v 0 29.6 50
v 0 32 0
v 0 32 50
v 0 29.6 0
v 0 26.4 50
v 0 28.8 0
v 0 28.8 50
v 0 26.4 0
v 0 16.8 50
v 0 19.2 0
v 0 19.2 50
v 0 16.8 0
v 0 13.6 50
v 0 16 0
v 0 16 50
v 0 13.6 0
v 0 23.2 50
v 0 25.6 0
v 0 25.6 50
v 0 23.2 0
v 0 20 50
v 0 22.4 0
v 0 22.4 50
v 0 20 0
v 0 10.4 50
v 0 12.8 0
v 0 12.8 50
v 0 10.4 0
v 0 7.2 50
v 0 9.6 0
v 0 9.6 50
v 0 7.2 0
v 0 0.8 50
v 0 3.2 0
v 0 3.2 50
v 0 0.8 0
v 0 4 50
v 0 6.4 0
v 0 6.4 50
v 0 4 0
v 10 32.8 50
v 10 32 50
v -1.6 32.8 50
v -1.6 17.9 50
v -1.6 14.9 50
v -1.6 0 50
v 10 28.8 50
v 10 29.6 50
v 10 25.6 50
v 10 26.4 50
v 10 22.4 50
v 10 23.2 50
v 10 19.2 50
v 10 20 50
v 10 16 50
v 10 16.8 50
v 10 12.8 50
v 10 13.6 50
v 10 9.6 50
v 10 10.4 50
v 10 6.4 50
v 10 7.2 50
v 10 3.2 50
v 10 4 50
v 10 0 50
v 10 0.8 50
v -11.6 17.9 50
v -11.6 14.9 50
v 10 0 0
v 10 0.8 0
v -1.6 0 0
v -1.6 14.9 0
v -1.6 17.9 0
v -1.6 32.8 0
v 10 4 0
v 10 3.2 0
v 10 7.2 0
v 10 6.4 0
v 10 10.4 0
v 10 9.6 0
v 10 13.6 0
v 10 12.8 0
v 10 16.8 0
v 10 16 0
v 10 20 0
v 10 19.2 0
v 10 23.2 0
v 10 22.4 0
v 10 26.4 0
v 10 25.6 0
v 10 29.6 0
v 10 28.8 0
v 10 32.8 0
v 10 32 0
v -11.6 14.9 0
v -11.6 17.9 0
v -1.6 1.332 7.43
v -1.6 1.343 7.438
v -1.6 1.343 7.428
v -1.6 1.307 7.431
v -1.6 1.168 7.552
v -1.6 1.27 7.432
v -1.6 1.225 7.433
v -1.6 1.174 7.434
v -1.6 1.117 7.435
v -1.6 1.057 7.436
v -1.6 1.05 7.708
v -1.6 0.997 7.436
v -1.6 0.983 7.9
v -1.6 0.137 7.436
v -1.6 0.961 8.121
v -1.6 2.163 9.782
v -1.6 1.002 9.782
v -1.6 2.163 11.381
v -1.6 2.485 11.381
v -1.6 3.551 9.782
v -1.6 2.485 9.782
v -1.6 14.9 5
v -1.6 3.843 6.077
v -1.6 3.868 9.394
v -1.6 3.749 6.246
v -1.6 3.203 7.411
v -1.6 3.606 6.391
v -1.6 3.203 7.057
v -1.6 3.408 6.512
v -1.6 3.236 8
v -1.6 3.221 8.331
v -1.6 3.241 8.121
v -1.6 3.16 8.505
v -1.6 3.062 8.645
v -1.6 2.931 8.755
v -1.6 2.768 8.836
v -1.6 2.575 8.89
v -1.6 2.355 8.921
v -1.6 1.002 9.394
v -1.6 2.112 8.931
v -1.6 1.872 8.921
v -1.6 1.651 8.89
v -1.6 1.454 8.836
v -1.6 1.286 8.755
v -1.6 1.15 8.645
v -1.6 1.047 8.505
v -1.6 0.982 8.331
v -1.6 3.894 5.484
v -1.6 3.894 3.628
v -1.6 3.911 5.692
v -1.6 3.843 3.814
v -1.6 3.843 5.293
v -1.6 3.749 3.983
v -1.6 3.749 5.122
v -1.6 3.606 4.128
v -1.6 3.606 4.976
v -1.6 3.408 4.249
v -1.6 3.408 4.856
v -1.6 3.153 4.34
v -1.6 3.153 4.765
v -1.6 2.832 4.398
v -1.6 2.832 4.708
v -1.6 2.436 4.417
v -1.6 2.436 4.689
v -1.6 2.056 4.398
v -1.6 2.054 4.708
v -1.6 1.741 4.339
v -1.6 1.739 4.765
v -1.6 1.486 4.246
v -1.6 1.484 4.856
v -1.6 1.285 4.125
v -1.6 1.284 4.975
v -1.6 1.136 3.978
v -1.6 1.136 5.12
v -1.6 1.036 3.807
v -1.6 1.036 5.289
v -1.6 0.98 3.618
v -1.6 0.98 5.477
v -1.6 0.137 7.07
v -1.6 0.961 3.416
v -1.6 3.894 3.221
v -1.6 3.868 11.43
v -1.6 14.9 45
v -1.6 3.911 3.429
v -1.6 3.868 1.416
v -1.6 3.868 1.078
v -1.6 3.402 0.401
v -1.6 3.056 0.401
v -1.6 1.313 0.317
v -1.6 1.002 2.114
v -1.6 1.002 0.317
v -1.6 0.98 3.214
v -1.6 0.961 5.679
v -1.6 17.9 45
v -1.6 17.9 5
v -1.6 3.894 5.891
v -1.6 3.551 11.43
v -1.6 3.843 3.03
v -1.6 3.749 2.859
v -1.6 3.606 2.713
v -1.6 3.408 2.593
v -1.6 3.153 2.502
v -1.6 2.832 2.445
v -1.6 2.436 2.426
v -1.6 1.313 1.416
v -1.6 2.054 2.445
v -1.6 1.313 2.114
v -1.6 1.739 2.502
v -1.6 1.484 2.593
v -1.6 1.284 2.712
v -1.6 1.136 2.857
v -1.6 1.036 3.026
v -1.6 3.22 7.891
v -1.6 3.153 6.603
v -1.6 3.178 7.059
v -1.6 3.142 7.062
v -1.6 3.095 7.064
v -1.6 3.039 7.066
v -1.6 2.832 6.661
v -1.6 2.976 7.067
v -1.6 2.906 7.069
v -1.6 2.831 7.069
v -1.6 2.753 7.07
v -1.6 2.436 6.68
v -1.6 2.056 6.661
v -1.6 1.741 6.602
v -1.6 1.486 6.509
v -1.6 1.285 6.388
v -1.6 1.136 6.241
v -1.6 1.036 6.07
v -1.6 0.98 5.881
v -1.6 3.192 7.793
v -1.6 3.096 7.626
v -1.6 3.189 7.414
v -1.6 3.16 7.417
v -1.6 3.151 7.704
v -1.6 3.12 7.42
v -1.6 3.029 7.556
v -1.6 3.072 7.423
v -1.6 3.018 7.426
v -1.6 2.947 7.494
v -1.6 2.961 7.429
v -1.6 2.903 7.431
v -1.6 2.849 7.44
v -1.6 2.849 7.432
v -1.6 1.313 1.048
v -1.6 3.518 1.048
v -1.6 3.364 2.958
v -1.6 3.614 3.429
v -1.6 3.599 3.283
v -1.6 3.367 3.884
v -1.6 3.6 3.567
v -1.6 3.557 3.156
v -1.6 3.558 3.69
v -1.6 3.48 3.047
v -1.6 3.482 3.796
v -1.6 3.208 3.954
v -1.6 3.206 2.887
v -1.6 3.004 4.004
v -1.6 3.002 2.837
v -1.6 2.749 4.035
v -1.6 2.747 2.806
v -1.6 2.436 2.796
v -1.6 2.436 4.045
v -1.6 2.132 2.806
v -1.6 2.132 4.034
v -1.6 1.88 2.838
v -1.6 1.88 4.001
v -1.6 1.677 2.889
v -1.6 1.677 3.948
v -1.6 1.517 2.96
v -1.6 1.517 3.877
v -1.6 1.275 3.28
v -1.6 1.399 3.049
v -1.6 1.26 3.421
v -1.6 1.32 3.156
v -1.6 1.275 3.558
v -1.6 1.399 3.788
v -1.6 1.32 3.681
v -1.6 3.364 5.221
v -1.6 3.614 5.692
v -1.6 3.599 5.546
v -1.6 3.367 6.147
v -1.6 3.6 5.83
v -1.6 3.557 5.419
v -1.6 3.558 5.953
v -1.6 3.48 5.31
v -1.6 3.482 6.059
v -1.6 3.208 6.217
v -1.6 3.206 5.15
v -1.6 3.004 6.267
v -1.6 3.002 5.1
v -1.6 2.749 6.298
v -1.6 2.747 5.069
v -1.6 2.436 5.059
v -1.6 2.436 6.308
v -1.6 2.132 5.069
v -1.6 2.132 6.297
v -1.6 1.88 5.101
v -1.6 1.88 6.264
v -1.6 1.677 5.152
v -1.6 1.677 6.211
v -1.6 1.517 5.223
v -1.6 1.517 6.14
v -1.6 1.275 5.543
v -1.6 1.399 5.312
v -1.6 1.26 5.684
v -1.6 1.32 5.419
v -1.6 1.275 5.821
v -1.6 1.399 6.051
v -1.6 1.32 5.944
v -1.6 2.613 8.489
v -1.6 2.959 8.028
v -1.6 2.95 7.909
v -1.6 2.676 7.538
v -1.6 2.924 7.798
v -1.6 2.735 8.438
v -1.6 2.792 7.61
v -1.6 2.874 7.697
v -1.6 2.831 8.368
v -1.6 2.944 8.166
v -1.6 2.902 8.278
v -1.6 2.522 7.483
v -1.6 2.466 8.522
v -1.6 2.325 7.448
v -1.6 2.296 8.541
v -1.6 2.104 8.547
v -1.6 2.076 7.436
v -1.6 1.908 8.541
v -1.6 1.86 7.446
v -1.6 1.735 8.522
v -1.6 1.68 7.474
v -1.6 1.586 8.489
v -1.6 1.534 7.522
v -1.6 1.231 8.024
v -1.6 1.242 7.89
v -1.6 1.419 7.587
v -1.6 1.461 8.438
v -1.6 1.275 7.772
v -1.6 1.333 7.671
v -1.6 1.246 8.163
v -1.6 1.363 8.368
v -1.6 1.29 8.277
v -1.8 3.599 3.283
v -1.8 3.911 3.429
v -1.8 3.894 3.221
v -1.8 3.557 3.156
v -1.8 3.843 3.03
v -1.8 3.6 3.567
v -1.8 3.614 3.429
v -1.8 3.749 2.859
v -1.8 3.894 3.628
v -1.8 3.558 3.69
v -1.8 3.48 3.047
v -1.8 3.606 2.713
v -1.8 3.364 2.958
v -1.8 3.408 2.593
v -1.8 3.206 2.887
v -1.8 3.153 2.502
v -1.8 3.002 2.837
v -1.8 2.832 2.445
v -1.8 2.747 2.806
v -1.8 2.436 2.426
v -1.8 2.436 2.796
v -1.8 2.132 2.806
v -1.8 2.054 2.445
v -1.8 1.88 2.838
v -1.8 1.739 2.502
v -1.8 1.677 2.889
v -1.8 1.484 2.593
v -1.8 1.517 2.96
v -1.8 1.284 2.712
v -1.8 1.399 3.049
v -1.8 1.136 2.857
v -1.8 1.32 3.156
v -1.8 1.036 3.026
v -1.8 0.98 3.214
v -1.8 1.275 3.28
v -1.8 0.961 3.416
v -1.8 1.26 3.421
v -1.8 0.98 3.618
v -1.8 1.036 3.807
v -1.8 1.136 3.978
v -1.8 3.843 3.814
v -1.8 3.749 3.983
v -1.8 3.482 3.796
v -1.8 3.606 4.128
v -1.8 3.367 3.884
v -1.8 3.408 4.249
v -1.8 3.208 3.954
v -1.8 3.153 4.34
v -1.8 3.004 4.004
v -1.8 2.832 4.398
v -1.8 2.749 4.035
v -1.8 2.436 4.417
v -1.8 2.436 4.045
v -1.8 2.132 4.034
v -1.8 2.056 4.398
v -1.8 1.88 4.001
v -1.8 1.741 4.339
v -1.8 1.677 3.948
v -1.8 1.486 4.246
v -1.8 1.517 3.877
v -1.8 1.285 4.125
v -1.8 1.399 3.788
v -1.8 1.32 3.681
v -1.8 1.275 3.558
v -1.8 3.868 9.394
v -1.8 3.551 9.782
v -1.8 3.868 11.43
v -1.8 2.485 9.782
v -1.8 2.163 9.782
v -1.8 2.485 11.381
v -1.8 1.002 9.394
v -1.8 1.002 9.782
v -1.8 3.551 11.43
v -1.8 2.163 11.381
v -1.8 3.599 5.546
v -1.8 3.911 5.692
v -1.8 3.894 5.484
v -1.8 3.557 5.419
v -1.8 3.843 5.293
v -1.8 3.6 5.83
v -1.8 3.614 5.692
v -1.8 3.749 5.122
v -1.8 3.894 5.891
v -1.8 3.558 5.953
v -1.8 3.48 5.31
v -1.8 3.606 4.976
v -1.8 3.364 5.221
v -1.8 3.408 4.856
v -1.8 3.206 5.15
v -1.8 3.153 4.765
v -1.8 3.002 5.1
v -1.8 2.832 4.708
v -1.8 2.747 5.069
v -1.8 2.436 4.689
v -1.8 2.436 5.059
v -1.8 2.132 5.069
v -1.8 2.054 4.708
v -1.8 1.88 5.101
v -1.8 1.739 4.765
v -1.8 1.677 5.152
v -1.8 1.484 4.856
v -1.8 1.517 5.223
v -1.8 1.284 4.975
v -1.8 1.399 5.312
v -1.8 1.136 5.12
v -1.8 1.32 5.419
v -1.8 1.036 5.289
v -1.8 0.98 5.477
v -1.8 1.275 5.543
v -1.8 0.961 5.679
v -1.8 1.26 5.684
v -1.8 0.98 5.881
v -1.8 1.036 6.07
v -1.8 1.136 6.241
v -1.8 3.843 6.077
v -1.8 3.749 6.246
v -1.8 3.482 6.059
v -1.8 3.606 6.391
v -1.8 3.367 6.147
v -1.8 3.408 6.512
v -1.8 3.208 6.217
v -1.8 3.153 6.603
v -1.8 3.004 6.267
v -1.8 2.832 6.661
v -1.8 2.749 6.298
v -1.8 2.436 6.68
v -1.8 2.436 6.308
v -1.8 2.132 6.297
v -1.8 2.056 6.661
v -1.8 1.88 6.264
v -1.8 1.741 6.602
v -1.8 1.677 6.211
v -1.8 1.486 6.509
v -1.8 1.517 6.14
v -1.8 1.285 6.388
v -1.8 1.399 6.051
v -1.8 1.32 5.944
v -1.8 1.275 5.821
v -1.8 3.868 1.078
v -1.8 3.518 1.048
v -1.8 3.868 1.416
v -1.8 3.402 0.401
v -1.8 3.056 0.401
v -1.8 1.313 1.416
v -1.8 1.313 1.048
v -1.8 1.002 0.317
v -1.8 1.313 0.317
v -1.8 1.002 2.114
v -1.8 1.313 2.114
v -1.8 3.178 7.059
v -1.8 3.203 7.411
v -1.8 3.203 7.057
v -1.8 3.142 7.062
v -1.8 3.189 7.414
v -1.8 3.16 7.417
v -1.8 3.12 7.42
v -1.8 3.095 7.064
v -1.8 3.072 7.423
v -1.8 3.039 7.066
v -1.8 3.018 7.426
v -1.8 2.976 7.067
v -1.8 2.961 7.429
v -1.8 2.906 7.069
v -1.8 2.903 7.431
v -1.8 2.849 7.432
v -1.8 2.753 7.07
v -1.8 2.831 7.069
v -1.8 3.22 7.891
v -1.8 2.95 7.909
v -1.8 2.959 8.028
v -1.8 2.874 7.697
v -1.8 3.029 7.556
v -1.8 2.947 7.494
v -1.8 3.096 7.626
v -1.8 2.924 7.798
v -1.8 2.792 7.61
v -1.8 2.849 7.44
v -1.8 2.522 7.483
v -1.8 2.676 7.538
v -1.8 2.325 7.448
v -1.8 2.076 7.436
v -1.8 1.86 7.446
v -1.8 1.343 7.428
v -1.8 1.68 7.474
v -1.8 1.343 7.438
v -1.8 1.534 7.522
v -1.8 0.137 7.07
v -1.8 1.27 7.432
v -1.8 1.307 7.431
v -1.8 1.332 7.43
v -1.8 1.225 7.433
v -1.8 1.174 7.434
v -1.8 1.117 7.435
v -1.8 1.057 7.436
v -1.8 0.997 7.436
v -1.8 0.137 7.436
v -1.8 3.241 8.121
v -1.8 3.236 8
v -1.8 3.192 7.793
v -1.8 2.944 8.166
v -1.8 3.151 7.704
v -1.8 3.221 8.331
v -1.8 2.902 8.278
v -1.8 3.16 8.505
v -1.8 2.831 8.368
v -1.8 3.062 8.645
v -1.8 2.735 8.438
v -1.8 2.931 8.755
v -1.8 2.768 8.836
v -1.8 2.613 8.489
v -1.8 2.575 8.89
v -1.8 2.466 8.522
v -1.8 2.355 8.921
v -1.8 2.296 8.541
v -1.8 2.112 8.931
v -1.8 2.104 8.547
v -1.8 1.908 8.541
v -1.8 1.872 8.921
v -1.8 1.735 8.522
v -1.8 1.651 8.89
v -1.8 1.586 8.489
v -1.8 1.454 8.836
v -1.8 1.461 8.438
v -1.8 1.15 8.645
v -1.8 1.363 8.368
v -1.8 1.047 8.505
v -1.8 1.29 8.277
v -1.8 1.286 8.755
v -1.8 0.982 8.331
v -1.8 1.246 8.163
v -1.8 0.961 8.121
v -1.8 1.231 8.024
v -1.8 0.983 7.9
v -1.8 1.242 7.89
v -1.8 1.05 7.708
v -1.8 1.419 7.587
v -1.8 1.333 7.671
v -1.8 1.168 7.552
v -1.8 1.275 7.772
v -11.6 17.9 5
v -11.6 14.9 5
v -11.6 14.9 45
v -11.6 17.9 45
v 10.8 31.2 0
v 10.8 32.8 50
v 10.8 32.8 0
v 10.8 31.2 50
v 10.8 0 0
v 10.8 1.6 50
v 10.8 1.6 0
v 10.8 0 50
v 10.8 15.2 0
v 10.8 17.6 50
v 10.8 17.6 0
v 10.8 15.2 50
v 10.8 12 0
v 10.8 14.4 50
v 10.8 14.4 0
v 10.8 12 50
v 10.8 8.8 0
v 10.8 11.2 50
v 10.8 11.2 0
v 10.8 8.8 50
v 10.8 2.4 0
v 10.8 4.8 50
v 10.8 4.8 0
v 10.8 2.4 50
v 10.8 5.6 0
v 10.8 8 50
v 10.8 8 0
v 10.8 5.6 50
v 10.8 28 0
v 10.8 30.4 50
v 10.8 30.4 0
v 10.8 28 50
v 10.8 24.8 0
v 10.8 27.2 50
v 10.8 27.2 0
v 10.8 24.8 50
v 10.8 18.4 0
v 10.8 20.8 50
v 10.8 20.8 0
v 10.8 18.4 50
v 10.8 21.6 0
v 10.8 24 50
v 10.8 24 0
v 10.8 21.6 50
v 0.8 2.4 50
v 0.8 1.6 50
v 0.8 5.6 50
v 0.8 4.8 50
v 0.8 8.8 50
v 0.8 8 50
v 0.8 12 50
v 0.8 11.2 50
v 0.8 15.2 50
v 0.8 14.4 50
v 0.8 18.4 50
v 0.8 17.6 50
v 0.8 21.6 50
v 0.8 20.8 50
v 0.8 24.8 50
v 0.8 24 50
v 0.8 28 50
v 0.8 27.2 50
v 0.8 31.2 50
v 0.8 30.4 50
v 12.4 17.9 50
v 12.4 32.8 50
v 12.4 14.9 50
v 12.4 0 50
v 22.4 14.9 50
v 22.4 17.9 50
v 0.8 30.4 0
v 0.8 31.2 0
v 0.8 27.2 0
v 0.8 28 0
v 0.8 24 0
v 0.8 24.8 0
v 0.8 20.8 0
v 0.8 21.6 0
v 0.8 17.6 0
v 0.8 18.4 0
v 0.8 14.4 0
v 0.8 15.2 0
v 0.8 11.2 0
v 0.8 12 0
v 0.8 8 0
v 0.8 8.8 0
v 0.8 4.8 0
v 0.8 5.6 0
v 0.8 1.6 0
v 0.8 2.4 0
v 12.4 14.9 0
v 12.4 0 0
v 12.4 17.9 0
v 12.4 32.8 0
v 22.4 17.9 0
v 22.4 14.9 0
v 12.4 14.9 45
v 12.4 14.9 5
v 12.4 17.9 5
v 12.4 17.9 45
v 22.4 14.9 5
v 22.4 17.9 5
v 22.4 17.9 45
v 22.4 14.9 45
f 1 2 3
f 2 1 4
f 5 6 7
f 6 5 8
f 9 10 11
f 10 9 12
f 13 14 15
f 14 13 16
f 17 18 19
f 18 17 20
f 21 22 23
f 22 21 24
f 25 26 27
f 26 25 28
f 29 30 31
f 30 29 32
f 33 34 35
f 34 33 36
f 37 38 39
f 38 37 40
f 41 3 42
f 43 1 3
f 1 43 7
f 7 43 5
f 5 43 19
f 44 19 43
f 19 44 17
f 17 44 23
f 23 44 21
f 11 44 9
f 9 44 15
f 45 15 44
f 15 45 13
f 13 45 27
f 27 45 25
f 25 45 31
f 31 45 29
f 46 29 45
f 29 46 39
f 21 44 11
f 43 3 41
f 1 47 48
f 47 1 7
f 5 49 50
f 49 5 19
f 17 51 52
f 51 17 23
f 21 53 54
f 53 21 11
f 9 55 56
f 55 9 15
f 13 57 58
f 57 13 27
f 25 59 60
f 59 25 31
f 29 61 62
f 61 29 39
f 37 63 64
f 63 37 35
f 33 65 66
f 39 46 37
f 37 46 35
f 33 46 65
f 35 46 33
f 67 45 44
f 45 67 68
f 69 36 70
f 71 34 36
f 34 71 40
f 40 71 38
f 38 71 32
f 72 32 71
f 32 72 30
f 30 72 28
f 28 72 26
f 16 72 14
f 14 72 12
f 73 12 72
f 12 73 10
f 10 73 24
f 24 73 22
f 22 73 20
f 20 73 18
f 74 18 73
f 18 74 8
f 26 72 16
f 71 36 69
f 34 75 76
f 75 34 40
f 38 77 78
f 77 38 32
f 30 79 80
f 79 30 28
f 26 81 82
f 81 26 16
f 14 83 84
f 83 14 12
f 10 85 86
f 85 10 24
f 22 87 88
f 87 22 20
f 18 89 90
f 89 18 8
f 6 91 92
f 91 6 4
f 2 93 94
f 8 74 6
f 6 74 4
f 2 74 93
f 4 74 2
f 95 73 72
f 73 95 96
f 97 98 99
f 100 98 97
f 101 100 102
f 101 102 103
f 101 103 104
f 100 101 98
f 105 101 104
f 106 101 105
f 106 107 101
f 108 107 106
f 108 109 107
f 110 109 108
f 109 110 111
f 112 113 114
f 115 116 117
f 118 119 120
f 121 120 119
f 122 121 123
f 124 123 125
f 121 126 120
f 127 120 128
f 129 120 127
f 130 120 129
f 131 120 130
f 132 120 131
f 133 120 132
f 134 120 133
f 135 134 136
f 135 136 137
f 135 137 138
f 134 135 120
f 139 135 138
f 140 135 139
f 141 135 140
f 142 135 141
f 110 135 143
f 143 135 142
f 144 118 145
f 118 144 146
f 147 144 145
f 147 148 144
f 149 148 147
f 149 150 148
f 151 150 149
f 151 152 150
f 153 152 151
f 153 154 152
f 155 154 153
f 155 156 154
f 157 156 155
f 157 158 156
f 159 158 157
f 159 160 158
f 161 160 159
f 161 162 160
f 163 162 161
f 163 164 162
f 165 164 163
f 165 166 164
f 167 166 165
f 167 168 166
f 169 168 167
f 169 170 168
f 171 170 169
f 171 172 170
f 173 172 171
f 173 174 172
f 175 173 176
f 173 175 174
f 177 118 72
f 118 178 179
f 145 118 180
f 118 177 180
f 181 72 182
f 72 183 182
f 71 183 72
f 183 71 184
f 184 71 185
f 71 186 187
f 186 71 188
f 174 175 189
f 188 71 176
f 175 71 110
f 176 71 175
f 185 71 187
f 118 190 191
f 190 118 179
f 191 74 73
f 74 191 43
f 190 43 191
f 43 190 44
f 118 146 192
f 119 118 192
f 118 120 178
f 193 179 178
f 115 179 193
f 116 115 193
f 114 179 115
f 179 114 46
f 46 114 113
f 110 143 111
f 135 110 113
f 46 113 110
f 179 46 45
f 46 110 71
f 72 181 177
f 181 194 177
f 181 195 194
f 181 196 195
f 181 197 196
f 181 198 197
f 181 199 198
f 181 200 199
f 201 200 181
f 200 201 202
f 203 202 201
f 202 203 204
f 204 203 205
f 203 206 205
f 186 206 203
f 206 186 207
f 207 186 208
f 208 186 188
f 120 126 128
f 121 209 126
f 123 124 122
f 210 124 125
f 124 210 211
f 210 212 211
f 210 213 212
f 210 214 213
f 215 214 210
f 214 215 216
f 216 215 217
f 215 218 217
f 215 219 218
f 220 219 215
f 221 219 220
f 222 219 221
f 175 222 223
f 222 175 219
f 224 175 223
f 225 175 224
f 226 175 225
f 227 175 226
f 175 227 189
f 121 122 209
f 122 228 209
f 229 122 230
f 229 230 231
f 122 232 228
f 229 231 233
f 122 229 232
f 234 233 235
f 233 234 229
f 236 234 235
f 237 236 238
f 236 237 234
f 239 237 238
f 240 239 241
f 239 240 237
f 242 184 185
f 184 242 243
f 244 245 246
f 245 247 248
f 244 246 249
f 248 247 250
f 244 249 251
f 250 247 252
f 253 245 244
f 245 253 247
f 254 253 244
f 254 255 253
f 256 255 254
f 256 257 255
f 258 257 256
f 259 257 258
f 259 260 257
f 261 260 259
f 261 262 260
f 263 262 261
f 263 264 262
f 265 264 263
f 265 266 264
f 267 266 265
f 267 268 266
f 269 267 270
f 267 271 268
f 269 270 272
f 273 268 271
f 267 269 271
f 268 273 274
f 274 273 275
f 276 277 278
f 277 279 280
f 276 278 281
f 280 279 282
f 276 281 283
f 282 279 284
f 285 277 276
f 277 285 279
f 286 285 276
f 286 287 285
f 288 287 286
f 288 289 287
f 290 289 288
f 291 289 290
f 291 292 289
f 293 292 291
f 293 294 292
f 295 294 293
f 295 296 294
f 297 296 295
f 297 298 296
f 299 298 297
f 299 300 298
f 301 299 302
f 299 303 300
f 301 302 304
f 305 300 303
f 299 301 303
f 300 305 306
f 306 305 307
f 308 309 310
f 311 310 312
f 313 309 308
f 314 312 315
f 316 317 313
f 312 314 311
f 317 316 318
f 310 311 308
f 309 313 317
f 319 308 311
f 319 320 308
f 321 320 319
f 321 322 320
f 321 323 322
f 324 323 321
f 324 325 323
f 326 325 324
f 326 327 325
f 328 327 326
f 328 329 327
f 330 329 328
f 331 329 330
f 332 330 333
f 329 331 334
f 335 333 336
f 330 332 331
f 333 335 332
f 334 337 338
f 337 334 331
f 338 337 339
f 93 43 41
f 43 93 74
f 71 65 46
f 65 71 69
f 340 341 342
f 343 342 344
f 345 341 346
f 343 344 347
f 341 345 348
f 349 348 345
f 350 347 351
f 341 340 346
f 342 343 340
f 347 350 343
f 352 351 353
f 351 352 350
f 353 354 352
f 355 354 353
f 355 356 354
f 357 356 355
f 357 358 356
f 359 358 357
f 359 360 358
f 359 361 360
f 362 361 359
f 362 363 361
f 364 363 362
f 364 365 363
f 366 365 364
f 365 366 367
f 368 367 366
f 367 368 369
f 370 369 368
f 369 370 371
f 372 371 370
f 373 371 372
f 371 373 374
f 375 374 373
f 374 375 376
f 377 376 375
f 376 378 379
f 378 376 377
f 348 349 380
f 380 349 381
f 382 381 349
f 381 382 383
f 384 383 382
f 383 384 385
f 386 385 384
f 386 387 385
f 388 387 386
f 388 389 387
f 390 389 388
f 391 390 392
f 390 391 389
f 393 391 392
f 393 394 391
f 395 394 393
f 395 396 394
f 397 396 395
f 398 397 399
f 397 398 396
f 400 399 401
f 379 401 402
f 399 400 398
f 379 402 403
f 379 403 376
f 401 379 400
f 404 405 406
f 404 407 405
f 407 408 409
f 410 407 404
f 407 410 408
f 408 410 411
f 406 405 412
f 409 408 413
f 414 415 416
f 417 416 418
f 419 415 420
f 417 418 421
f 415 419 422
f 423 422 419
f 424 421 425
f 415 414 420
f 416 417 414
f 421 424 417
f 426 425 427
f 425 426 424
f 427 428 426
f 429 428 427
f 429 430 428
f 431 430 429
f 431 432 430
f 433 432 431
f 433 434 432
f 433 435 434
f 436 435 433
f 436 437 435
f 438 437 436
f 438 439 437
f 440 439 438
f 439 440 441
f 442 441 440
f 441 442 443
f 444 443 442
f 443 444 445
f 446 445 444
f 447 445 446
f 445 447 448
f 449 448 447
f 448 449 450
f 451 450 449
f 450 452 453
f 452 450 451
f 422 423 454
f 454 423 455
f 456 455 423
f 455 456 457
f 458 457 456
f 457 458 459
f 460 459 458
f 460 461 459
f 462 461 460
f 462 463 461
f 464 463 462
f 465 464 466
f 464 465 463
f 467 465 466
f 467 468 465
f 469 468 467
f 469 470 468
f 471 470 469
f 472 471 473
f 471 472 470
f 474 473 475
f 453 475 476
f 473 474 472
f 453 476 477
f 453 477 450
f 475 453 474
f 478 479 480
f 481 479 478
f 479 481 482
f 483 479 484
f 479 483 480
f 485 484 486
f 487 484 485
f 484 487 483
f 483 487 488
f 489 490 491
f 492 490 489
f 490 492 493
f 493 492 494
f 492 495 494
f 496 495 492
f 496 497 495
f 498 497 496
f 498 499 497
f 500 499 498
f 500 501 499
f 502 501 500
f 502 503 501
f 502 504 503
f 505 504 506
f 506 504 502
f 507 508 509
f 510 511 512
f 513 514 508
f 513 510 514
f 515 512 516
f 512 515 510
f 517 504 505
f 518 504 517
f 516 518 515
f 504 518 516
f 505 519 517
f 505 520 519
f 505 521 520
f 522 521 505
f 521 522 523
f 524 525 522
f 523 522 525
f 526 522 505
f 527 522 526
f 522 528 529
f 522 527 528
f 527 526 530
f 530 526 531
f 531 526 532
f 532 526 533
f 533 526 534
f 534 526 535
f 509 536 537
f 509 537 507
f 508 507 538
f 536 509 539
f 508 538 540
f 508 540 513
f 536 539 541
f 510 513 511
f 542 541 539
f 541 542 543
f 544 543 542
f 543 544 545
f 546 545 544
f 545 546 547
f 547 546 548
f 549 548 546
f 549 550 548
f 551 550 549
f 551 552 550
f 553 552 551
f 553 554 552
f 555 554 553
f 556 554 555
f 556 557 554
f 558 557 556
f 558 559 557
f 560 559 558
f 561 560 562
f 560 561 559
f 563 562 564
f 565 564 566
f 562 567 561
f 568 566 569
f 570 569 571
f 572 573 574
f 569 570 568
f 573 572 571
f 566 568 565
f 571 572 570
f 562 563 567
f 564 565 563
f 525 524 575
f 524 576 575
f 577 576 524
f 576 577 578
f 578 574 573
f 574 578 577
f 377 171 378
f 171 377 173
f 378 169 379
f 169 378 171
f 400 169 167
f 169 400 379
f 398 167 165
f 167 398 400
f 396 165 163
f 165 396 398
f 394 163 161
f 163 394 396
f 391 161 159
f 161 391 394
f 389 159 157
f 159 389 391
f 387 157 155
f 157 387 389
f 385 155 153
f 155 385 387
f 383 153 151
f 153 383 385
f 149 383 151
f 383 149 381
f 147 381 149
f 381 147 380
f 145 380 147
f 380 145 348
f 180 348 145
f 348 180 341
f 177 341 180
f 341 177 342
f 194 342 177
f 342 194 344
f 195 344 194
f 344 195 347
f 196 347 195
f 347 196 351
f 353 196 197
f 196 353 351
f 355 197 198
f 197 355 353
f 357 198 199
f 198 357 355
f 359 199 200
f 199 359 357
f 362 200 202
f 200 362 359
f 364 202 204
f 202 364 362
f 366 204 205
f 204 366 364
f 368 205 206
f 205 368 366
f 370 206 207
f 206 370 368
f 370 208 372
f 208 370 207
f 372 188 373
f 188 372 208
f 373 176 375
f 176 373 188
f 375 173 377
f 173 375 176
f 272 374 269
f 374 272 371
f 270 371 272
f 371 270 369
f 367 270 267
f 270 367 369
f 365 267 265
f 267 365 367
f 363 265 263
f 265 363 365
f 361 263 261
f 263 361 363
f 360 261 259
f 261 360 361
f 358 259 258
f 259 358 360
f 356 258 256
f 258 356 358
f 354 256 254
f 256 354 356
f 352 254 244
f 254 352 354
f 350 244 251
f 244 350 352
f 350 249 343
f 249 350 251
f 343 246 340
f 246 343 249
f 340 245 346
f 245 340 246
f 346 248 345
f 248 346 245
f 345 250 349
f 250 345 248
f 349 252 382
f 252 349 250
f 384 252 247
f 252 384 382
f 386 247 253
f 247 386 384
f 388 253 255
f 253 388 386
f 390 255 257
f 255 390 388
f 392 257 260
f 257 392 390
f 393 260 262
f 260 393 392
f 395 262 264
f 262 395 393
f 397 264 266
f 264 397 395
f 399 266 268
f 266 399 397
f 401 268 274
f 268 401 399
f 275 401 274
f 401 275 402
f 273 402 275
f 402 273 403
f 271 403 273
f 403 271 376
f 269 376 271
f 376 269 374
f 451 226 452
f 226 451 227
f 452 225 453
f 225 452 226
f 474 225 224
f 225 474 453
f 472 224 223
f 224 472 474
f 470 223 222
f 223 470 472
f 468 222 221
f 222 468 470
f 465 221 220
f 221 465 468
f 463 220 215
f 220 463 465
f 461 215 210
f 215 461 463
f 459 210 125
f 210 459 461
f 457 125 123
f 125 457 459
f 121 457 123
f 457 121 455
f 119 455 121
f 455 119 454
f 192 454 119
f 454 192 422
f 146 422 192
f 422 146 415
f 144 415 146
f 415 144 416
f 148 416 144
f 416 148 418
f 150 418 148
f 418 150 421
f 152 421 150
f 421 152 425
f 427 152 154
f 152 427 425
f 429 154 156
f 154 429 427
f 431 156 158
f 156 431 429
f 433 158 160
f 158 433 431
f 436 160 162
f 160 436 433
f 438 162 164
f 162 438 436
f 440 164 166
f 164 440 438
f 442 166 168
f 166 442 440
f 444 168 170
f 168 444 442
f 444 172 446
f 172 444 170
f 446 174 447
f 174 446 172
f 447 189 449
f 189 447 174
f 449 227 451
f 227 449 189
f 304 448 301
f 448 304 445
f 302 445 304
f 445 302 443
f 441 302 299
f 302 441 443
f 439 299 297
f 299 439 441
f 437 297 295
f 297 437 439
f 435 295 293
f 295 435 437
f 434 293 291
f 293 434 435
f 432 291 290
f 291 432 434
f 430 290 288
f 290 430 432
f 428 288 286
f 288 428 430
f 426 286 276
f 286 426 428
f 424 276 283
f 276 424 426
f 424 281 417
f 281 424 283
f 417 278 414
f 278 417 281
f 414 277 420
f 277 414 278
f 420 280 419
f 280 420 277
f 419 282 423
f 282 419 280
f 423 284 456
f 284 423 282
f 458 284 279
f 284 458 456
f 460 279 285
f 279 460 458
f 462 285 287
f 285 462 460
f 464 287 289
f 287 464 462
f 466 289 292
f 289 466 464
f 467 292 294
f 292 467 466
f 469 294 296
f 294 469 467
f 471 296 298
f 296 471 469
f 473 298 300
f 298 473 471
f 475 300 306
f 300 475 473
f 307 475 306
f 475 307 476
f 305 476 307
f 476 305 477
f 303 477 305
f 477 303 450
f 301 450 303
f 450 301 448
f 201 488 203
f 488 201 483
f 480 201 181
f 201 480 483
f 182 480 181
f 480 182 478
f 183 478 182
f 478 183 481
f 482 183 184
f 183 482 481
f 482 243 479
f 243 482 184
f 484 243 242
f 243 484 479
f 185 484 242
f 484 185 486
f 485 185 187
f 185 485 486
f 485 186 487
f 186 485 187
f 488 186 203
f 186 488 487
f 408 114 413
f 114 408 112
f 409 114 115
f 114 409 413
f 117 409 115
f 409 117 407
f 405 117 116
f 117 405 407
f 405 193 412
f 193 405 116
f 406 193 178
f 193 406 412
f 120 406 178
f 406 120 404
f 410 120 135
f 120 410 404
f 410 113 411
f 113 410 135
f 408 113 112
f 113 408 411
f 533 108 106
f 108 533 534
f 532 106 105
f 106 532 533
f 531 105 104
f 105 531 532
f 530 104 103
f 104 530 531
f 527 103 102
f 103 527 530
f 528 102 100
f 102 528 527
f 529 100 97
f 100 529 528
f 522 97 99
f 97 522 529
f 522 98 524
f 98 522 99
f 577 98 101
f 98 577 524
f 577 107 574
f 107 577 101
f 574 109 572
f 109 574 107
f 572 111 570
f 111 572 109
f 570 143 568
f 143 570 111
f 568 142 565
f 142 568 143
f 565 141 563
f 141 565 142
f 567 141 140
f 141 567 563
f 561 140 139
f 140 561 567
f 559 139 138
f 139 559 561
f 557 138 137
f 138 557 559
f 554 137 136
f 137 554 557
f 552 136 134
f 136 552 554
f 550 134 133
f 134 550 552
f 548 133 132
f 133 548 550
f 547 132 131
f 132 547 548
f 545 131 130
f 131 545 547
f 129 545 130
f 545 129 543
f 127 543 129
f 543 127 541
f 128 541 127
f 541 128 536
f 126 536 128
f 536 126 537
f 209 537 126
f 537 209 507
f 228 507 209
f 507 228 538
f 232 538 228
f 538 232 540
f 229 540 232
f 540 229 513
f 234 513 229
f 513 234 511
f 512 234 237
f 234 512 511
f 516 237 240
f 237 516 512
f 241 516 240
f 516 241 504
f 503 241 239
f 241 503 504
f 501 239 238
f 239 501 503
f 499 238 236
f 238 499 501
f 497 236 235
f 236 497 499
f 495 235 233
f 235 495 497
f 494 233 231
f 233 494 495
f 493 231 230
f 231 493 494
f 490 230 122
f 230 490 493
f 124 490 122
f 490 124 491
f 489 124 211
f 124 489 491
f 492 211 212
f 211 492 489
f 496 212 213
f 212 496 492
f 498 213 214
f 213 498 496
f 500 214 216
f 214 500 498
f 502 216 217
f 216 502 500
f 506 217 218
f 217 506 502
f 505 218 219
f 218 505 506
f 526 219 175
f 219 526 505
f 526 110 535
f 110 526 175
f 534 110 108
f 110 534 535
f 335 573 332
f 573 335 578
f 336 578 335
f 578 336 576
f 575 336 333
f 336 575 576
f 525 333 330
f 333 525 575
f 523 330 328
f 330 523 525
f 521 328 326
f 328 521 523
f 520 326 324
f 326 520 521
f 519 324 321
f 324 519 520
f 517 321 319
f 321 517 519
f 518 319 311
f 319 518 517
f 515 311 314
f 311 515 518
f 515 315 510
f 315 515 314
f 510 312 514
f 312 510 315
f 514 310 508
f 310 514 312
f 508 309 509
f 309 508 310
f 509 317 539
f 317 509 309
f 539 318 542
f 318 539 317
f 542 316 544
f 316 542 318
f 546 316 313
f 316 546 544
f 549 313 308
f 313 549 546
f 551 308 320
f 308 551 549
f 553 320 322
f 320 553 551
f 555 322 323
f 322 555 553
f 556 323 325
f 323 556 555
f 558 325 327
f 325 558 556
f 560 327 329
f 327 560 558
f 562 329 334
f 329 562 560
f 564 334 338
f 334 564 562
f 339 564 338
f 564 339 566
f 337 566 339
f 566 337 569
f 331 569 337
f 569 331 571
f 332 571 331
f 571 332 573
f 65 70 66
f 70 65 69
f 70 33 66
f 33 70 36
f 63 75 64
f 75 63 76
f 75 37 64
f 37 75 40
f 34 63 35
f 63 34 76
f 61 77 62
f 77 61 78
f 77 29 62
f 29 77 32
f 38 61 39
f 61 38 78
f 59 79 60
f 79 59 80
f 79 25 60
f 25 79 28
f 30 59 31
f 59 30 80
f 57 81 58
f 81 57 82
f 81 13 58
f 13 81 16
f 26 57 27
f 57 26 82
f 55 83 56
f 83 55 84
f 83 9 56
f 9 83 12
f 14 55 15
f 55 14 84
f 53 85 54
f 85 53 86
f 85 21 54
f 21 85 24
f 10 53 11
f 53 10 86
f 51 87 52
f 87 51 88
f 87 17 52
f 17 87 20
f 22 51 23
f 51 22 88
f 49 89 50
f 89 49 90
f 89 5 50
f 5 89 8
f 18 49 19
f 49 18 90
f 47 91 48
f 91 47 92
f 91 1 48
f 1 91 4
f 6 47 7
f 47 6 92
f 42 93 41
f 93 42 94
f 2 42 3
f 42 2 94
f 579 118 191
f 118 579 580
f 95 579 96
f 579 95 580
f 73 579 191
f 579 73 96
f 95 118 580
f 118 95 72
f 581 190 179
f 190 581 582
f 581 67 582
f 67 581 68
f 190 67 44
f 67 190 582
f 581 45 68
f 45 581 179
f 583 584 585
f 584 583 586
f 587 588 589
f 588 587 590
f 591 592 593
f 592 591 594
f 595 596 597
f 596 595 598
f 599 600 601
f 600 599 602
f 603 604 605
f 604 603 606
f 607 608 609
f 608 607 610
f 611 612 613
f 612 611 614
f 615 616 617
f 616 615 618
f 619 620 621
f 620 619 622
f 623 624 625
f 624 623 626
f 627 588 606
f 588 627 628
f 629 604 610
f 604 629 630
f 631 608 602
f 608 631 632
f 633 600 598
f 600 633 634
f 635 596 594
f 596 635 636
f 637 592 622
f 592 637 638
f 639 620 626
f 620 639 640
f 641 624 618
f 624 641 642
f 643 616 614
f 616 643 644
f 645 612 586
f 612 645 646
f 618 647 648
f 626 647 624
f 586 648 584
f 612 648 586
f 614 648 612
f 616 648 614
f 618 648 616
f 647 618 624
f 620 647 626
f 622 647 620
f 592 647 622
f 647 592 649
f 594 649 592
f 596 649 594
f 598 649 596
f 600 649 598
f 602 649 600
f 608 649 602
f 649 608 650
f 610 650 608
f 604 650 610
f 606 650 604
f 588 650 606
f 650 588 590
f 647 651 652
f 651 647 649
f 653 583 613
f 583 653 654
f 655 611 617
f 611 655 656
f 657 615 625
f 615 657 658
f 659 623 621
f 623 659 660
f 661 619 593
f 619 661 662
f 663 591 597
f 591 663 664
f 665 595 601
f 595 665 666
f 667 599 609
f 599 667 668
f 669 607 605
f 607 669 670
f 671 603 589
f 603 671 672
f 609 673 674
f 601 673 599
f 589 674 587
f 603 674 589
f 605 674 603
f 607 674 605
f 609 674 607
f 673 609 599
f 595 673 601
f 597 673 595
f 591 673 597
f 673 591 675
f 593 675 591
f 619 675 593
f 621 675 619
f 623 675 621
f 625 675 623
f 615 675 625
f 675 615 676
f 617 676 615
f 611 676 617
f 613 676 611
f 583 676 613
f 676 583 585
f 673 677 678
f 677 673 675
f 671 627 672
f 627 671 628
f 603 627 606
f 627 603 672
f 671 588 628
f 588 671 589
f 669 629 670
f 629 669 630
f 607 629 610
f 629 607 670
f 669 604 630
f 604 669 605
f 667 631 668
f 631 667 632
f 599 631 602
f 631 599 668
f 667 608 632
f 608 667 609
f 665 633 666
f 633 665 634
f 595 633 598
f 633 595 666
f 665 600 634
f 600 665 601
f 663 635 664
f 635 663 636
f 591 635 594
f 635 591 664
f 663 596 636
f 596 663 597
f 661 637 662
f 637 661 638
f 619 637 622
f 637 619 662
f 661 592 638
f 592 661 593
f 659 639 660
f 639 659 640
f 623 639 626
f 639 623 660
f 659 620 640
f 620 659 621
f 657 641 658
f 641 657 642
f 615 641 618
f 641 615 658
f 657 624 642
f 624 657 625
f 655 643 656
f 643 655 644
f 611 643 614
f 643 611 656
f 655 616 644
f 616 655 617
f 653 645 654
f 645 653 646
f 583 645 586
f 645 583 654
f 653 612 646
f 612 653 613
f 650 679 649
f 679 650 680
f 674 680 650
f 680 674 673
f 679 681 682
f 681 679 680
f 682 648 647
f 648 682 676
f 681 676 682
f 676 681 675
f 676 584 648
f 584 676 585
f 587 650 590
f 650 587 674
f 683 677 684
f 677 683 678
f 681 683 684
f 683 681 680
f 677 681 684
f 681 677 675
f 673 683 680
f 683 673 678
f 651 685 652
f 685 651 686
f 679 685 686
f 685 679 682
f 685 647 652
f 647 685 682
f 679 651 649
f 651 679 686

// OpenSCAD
// Comb Capacitor
// Idealized capacitance calculations
// Modeled as several parallel plates

// Ideal Capacitance (pF)
idealCapacitance = 100;
// Height of capacitor (mm)
fingerHeight = 50;
// Length of each finger (mm)
fingerLength = 10;
// Width of each finger (mm)
fingerWidth = 0.8;
// Air gap between fingers (mm)
dielectricGap = 0.8;
// Text size
textSize = 3;

// normalized parameters to Farads and Meters
NidealCapacitance = idealCapacitance * pow(10, -12);
NfingerHeight = fingerHeight / 1000;
NfingerLength = fingerLength / 1000;
NfingerWidth = fingerWidth / 1000;
NdielectricGap = dielectricGap / 1000;

// max overlap area of each plate
overlapAreaPlate = NfingerHeight * (NfingerLength - NdielectricGap);
    
// Permittivity of free space
Eo = 8.854 * pow(10, -12); 
    
// Dielectric Constant of Air
K = 1.00059;

// Dielectric Constant of PLA plastic
// https://www.zhinst.com/americas/ko/blogs/measuring-dielectric-properties-materials-varying-thickness
//K = 2.7;

// Calculate capacitence per parallel plates
cPlate = (K*Eo*overlapAreaPlate) / NdielectricGap;
echo(cPlate);

// Calculate number of parallel plates needed
echo(ceil(NidealCapacitance / cPlate));
numPlates = ceil(ceil(NidealCapacitance / cPlate)/2);
echo(numPlates);

// Calculate length of the comb spine
spineLength = numPlates * 2 *(fingerWidth + dielectricGap) + fingerWidth;

module BasePlate() {
    union () {
        translate([-fingerWidth*2, 0, -2])
            cube([dielectricGap + fingerLength + fingerWidth*2, spineLength, 1.6]);
    
        //spacers between plates
        for (x = [1:2:numPlates*4]) {
            translate([dielectricGap, x * (fingerWidth) + dielectricGap/4, -2])
                cube([fingerLength-dielectricGap, dielectricGap/2, fingerHeight]);
        }
    }
}    

module CombCap() {
    // comb 1
    union () {
        // spine of comb 1
        union () {
        translate([-fingerWidth*2 ,0, 0])
            cube([fingerWidth*2, spineLength, fingerHeight]);
        
        // value text
        translate([-fingerWidth*2,(fingerWidth*1.5 + dielectricGap),0])
            rotate([90,270,270])
                linear_extrude(0.2)
                    text(text = str(idealCapacitance,"pF"), size = textSize, valign = "center");
        }
        // plates for comb 1
        for (x = [0:numPlates]) {
            translate([0, x * ((3*dielectricGap)+fingerWidth), 0])
                cube([fingerLength, fingerWidth, fingerHeight]);       
        }
        
        // clip location
        translate([(-fingerWidth*2)-10, (spineLength/2)-(3/2), 0])
            cube([10, 3, 5]);
        
        translate([(-fingerWidth*2)-10, (spineLength/2)-(3/2), fingerHeight-5])
            cube([10, 3, 5]);
    }        

    // comb 2
    union (){
        // spine of comb 2
        translate([dielectricGap + fingerLength ,0, 0])
            cube([fingerWidth*2, spineLength, fingerHeight]);
        
        // plates for comb 2
        for (x = [0:numPlates-1]) {
            translate([dielectricGap, fingerWidth + dielectricGap + (x * (3*dielectricGap+fingerWidth)), 0])
                cube([fingerLength, fingerWidth, fingerHeight]);       
        }
        
        // clip location
        translate([dielectricGap + fingerLength + fingerWidth*2, (spineLength/2)-(3/2), 0])
            cube([10, 3, 5]);
        
        translate([dielectricGap + fingerLength + fingerWidth*2, (spineLength/2)-(3/2), fingerHeight-5])
            cube([10, 3, 5]);
    } 
}

color("grey") CombCap();

//color("yellow") BasePlate();
